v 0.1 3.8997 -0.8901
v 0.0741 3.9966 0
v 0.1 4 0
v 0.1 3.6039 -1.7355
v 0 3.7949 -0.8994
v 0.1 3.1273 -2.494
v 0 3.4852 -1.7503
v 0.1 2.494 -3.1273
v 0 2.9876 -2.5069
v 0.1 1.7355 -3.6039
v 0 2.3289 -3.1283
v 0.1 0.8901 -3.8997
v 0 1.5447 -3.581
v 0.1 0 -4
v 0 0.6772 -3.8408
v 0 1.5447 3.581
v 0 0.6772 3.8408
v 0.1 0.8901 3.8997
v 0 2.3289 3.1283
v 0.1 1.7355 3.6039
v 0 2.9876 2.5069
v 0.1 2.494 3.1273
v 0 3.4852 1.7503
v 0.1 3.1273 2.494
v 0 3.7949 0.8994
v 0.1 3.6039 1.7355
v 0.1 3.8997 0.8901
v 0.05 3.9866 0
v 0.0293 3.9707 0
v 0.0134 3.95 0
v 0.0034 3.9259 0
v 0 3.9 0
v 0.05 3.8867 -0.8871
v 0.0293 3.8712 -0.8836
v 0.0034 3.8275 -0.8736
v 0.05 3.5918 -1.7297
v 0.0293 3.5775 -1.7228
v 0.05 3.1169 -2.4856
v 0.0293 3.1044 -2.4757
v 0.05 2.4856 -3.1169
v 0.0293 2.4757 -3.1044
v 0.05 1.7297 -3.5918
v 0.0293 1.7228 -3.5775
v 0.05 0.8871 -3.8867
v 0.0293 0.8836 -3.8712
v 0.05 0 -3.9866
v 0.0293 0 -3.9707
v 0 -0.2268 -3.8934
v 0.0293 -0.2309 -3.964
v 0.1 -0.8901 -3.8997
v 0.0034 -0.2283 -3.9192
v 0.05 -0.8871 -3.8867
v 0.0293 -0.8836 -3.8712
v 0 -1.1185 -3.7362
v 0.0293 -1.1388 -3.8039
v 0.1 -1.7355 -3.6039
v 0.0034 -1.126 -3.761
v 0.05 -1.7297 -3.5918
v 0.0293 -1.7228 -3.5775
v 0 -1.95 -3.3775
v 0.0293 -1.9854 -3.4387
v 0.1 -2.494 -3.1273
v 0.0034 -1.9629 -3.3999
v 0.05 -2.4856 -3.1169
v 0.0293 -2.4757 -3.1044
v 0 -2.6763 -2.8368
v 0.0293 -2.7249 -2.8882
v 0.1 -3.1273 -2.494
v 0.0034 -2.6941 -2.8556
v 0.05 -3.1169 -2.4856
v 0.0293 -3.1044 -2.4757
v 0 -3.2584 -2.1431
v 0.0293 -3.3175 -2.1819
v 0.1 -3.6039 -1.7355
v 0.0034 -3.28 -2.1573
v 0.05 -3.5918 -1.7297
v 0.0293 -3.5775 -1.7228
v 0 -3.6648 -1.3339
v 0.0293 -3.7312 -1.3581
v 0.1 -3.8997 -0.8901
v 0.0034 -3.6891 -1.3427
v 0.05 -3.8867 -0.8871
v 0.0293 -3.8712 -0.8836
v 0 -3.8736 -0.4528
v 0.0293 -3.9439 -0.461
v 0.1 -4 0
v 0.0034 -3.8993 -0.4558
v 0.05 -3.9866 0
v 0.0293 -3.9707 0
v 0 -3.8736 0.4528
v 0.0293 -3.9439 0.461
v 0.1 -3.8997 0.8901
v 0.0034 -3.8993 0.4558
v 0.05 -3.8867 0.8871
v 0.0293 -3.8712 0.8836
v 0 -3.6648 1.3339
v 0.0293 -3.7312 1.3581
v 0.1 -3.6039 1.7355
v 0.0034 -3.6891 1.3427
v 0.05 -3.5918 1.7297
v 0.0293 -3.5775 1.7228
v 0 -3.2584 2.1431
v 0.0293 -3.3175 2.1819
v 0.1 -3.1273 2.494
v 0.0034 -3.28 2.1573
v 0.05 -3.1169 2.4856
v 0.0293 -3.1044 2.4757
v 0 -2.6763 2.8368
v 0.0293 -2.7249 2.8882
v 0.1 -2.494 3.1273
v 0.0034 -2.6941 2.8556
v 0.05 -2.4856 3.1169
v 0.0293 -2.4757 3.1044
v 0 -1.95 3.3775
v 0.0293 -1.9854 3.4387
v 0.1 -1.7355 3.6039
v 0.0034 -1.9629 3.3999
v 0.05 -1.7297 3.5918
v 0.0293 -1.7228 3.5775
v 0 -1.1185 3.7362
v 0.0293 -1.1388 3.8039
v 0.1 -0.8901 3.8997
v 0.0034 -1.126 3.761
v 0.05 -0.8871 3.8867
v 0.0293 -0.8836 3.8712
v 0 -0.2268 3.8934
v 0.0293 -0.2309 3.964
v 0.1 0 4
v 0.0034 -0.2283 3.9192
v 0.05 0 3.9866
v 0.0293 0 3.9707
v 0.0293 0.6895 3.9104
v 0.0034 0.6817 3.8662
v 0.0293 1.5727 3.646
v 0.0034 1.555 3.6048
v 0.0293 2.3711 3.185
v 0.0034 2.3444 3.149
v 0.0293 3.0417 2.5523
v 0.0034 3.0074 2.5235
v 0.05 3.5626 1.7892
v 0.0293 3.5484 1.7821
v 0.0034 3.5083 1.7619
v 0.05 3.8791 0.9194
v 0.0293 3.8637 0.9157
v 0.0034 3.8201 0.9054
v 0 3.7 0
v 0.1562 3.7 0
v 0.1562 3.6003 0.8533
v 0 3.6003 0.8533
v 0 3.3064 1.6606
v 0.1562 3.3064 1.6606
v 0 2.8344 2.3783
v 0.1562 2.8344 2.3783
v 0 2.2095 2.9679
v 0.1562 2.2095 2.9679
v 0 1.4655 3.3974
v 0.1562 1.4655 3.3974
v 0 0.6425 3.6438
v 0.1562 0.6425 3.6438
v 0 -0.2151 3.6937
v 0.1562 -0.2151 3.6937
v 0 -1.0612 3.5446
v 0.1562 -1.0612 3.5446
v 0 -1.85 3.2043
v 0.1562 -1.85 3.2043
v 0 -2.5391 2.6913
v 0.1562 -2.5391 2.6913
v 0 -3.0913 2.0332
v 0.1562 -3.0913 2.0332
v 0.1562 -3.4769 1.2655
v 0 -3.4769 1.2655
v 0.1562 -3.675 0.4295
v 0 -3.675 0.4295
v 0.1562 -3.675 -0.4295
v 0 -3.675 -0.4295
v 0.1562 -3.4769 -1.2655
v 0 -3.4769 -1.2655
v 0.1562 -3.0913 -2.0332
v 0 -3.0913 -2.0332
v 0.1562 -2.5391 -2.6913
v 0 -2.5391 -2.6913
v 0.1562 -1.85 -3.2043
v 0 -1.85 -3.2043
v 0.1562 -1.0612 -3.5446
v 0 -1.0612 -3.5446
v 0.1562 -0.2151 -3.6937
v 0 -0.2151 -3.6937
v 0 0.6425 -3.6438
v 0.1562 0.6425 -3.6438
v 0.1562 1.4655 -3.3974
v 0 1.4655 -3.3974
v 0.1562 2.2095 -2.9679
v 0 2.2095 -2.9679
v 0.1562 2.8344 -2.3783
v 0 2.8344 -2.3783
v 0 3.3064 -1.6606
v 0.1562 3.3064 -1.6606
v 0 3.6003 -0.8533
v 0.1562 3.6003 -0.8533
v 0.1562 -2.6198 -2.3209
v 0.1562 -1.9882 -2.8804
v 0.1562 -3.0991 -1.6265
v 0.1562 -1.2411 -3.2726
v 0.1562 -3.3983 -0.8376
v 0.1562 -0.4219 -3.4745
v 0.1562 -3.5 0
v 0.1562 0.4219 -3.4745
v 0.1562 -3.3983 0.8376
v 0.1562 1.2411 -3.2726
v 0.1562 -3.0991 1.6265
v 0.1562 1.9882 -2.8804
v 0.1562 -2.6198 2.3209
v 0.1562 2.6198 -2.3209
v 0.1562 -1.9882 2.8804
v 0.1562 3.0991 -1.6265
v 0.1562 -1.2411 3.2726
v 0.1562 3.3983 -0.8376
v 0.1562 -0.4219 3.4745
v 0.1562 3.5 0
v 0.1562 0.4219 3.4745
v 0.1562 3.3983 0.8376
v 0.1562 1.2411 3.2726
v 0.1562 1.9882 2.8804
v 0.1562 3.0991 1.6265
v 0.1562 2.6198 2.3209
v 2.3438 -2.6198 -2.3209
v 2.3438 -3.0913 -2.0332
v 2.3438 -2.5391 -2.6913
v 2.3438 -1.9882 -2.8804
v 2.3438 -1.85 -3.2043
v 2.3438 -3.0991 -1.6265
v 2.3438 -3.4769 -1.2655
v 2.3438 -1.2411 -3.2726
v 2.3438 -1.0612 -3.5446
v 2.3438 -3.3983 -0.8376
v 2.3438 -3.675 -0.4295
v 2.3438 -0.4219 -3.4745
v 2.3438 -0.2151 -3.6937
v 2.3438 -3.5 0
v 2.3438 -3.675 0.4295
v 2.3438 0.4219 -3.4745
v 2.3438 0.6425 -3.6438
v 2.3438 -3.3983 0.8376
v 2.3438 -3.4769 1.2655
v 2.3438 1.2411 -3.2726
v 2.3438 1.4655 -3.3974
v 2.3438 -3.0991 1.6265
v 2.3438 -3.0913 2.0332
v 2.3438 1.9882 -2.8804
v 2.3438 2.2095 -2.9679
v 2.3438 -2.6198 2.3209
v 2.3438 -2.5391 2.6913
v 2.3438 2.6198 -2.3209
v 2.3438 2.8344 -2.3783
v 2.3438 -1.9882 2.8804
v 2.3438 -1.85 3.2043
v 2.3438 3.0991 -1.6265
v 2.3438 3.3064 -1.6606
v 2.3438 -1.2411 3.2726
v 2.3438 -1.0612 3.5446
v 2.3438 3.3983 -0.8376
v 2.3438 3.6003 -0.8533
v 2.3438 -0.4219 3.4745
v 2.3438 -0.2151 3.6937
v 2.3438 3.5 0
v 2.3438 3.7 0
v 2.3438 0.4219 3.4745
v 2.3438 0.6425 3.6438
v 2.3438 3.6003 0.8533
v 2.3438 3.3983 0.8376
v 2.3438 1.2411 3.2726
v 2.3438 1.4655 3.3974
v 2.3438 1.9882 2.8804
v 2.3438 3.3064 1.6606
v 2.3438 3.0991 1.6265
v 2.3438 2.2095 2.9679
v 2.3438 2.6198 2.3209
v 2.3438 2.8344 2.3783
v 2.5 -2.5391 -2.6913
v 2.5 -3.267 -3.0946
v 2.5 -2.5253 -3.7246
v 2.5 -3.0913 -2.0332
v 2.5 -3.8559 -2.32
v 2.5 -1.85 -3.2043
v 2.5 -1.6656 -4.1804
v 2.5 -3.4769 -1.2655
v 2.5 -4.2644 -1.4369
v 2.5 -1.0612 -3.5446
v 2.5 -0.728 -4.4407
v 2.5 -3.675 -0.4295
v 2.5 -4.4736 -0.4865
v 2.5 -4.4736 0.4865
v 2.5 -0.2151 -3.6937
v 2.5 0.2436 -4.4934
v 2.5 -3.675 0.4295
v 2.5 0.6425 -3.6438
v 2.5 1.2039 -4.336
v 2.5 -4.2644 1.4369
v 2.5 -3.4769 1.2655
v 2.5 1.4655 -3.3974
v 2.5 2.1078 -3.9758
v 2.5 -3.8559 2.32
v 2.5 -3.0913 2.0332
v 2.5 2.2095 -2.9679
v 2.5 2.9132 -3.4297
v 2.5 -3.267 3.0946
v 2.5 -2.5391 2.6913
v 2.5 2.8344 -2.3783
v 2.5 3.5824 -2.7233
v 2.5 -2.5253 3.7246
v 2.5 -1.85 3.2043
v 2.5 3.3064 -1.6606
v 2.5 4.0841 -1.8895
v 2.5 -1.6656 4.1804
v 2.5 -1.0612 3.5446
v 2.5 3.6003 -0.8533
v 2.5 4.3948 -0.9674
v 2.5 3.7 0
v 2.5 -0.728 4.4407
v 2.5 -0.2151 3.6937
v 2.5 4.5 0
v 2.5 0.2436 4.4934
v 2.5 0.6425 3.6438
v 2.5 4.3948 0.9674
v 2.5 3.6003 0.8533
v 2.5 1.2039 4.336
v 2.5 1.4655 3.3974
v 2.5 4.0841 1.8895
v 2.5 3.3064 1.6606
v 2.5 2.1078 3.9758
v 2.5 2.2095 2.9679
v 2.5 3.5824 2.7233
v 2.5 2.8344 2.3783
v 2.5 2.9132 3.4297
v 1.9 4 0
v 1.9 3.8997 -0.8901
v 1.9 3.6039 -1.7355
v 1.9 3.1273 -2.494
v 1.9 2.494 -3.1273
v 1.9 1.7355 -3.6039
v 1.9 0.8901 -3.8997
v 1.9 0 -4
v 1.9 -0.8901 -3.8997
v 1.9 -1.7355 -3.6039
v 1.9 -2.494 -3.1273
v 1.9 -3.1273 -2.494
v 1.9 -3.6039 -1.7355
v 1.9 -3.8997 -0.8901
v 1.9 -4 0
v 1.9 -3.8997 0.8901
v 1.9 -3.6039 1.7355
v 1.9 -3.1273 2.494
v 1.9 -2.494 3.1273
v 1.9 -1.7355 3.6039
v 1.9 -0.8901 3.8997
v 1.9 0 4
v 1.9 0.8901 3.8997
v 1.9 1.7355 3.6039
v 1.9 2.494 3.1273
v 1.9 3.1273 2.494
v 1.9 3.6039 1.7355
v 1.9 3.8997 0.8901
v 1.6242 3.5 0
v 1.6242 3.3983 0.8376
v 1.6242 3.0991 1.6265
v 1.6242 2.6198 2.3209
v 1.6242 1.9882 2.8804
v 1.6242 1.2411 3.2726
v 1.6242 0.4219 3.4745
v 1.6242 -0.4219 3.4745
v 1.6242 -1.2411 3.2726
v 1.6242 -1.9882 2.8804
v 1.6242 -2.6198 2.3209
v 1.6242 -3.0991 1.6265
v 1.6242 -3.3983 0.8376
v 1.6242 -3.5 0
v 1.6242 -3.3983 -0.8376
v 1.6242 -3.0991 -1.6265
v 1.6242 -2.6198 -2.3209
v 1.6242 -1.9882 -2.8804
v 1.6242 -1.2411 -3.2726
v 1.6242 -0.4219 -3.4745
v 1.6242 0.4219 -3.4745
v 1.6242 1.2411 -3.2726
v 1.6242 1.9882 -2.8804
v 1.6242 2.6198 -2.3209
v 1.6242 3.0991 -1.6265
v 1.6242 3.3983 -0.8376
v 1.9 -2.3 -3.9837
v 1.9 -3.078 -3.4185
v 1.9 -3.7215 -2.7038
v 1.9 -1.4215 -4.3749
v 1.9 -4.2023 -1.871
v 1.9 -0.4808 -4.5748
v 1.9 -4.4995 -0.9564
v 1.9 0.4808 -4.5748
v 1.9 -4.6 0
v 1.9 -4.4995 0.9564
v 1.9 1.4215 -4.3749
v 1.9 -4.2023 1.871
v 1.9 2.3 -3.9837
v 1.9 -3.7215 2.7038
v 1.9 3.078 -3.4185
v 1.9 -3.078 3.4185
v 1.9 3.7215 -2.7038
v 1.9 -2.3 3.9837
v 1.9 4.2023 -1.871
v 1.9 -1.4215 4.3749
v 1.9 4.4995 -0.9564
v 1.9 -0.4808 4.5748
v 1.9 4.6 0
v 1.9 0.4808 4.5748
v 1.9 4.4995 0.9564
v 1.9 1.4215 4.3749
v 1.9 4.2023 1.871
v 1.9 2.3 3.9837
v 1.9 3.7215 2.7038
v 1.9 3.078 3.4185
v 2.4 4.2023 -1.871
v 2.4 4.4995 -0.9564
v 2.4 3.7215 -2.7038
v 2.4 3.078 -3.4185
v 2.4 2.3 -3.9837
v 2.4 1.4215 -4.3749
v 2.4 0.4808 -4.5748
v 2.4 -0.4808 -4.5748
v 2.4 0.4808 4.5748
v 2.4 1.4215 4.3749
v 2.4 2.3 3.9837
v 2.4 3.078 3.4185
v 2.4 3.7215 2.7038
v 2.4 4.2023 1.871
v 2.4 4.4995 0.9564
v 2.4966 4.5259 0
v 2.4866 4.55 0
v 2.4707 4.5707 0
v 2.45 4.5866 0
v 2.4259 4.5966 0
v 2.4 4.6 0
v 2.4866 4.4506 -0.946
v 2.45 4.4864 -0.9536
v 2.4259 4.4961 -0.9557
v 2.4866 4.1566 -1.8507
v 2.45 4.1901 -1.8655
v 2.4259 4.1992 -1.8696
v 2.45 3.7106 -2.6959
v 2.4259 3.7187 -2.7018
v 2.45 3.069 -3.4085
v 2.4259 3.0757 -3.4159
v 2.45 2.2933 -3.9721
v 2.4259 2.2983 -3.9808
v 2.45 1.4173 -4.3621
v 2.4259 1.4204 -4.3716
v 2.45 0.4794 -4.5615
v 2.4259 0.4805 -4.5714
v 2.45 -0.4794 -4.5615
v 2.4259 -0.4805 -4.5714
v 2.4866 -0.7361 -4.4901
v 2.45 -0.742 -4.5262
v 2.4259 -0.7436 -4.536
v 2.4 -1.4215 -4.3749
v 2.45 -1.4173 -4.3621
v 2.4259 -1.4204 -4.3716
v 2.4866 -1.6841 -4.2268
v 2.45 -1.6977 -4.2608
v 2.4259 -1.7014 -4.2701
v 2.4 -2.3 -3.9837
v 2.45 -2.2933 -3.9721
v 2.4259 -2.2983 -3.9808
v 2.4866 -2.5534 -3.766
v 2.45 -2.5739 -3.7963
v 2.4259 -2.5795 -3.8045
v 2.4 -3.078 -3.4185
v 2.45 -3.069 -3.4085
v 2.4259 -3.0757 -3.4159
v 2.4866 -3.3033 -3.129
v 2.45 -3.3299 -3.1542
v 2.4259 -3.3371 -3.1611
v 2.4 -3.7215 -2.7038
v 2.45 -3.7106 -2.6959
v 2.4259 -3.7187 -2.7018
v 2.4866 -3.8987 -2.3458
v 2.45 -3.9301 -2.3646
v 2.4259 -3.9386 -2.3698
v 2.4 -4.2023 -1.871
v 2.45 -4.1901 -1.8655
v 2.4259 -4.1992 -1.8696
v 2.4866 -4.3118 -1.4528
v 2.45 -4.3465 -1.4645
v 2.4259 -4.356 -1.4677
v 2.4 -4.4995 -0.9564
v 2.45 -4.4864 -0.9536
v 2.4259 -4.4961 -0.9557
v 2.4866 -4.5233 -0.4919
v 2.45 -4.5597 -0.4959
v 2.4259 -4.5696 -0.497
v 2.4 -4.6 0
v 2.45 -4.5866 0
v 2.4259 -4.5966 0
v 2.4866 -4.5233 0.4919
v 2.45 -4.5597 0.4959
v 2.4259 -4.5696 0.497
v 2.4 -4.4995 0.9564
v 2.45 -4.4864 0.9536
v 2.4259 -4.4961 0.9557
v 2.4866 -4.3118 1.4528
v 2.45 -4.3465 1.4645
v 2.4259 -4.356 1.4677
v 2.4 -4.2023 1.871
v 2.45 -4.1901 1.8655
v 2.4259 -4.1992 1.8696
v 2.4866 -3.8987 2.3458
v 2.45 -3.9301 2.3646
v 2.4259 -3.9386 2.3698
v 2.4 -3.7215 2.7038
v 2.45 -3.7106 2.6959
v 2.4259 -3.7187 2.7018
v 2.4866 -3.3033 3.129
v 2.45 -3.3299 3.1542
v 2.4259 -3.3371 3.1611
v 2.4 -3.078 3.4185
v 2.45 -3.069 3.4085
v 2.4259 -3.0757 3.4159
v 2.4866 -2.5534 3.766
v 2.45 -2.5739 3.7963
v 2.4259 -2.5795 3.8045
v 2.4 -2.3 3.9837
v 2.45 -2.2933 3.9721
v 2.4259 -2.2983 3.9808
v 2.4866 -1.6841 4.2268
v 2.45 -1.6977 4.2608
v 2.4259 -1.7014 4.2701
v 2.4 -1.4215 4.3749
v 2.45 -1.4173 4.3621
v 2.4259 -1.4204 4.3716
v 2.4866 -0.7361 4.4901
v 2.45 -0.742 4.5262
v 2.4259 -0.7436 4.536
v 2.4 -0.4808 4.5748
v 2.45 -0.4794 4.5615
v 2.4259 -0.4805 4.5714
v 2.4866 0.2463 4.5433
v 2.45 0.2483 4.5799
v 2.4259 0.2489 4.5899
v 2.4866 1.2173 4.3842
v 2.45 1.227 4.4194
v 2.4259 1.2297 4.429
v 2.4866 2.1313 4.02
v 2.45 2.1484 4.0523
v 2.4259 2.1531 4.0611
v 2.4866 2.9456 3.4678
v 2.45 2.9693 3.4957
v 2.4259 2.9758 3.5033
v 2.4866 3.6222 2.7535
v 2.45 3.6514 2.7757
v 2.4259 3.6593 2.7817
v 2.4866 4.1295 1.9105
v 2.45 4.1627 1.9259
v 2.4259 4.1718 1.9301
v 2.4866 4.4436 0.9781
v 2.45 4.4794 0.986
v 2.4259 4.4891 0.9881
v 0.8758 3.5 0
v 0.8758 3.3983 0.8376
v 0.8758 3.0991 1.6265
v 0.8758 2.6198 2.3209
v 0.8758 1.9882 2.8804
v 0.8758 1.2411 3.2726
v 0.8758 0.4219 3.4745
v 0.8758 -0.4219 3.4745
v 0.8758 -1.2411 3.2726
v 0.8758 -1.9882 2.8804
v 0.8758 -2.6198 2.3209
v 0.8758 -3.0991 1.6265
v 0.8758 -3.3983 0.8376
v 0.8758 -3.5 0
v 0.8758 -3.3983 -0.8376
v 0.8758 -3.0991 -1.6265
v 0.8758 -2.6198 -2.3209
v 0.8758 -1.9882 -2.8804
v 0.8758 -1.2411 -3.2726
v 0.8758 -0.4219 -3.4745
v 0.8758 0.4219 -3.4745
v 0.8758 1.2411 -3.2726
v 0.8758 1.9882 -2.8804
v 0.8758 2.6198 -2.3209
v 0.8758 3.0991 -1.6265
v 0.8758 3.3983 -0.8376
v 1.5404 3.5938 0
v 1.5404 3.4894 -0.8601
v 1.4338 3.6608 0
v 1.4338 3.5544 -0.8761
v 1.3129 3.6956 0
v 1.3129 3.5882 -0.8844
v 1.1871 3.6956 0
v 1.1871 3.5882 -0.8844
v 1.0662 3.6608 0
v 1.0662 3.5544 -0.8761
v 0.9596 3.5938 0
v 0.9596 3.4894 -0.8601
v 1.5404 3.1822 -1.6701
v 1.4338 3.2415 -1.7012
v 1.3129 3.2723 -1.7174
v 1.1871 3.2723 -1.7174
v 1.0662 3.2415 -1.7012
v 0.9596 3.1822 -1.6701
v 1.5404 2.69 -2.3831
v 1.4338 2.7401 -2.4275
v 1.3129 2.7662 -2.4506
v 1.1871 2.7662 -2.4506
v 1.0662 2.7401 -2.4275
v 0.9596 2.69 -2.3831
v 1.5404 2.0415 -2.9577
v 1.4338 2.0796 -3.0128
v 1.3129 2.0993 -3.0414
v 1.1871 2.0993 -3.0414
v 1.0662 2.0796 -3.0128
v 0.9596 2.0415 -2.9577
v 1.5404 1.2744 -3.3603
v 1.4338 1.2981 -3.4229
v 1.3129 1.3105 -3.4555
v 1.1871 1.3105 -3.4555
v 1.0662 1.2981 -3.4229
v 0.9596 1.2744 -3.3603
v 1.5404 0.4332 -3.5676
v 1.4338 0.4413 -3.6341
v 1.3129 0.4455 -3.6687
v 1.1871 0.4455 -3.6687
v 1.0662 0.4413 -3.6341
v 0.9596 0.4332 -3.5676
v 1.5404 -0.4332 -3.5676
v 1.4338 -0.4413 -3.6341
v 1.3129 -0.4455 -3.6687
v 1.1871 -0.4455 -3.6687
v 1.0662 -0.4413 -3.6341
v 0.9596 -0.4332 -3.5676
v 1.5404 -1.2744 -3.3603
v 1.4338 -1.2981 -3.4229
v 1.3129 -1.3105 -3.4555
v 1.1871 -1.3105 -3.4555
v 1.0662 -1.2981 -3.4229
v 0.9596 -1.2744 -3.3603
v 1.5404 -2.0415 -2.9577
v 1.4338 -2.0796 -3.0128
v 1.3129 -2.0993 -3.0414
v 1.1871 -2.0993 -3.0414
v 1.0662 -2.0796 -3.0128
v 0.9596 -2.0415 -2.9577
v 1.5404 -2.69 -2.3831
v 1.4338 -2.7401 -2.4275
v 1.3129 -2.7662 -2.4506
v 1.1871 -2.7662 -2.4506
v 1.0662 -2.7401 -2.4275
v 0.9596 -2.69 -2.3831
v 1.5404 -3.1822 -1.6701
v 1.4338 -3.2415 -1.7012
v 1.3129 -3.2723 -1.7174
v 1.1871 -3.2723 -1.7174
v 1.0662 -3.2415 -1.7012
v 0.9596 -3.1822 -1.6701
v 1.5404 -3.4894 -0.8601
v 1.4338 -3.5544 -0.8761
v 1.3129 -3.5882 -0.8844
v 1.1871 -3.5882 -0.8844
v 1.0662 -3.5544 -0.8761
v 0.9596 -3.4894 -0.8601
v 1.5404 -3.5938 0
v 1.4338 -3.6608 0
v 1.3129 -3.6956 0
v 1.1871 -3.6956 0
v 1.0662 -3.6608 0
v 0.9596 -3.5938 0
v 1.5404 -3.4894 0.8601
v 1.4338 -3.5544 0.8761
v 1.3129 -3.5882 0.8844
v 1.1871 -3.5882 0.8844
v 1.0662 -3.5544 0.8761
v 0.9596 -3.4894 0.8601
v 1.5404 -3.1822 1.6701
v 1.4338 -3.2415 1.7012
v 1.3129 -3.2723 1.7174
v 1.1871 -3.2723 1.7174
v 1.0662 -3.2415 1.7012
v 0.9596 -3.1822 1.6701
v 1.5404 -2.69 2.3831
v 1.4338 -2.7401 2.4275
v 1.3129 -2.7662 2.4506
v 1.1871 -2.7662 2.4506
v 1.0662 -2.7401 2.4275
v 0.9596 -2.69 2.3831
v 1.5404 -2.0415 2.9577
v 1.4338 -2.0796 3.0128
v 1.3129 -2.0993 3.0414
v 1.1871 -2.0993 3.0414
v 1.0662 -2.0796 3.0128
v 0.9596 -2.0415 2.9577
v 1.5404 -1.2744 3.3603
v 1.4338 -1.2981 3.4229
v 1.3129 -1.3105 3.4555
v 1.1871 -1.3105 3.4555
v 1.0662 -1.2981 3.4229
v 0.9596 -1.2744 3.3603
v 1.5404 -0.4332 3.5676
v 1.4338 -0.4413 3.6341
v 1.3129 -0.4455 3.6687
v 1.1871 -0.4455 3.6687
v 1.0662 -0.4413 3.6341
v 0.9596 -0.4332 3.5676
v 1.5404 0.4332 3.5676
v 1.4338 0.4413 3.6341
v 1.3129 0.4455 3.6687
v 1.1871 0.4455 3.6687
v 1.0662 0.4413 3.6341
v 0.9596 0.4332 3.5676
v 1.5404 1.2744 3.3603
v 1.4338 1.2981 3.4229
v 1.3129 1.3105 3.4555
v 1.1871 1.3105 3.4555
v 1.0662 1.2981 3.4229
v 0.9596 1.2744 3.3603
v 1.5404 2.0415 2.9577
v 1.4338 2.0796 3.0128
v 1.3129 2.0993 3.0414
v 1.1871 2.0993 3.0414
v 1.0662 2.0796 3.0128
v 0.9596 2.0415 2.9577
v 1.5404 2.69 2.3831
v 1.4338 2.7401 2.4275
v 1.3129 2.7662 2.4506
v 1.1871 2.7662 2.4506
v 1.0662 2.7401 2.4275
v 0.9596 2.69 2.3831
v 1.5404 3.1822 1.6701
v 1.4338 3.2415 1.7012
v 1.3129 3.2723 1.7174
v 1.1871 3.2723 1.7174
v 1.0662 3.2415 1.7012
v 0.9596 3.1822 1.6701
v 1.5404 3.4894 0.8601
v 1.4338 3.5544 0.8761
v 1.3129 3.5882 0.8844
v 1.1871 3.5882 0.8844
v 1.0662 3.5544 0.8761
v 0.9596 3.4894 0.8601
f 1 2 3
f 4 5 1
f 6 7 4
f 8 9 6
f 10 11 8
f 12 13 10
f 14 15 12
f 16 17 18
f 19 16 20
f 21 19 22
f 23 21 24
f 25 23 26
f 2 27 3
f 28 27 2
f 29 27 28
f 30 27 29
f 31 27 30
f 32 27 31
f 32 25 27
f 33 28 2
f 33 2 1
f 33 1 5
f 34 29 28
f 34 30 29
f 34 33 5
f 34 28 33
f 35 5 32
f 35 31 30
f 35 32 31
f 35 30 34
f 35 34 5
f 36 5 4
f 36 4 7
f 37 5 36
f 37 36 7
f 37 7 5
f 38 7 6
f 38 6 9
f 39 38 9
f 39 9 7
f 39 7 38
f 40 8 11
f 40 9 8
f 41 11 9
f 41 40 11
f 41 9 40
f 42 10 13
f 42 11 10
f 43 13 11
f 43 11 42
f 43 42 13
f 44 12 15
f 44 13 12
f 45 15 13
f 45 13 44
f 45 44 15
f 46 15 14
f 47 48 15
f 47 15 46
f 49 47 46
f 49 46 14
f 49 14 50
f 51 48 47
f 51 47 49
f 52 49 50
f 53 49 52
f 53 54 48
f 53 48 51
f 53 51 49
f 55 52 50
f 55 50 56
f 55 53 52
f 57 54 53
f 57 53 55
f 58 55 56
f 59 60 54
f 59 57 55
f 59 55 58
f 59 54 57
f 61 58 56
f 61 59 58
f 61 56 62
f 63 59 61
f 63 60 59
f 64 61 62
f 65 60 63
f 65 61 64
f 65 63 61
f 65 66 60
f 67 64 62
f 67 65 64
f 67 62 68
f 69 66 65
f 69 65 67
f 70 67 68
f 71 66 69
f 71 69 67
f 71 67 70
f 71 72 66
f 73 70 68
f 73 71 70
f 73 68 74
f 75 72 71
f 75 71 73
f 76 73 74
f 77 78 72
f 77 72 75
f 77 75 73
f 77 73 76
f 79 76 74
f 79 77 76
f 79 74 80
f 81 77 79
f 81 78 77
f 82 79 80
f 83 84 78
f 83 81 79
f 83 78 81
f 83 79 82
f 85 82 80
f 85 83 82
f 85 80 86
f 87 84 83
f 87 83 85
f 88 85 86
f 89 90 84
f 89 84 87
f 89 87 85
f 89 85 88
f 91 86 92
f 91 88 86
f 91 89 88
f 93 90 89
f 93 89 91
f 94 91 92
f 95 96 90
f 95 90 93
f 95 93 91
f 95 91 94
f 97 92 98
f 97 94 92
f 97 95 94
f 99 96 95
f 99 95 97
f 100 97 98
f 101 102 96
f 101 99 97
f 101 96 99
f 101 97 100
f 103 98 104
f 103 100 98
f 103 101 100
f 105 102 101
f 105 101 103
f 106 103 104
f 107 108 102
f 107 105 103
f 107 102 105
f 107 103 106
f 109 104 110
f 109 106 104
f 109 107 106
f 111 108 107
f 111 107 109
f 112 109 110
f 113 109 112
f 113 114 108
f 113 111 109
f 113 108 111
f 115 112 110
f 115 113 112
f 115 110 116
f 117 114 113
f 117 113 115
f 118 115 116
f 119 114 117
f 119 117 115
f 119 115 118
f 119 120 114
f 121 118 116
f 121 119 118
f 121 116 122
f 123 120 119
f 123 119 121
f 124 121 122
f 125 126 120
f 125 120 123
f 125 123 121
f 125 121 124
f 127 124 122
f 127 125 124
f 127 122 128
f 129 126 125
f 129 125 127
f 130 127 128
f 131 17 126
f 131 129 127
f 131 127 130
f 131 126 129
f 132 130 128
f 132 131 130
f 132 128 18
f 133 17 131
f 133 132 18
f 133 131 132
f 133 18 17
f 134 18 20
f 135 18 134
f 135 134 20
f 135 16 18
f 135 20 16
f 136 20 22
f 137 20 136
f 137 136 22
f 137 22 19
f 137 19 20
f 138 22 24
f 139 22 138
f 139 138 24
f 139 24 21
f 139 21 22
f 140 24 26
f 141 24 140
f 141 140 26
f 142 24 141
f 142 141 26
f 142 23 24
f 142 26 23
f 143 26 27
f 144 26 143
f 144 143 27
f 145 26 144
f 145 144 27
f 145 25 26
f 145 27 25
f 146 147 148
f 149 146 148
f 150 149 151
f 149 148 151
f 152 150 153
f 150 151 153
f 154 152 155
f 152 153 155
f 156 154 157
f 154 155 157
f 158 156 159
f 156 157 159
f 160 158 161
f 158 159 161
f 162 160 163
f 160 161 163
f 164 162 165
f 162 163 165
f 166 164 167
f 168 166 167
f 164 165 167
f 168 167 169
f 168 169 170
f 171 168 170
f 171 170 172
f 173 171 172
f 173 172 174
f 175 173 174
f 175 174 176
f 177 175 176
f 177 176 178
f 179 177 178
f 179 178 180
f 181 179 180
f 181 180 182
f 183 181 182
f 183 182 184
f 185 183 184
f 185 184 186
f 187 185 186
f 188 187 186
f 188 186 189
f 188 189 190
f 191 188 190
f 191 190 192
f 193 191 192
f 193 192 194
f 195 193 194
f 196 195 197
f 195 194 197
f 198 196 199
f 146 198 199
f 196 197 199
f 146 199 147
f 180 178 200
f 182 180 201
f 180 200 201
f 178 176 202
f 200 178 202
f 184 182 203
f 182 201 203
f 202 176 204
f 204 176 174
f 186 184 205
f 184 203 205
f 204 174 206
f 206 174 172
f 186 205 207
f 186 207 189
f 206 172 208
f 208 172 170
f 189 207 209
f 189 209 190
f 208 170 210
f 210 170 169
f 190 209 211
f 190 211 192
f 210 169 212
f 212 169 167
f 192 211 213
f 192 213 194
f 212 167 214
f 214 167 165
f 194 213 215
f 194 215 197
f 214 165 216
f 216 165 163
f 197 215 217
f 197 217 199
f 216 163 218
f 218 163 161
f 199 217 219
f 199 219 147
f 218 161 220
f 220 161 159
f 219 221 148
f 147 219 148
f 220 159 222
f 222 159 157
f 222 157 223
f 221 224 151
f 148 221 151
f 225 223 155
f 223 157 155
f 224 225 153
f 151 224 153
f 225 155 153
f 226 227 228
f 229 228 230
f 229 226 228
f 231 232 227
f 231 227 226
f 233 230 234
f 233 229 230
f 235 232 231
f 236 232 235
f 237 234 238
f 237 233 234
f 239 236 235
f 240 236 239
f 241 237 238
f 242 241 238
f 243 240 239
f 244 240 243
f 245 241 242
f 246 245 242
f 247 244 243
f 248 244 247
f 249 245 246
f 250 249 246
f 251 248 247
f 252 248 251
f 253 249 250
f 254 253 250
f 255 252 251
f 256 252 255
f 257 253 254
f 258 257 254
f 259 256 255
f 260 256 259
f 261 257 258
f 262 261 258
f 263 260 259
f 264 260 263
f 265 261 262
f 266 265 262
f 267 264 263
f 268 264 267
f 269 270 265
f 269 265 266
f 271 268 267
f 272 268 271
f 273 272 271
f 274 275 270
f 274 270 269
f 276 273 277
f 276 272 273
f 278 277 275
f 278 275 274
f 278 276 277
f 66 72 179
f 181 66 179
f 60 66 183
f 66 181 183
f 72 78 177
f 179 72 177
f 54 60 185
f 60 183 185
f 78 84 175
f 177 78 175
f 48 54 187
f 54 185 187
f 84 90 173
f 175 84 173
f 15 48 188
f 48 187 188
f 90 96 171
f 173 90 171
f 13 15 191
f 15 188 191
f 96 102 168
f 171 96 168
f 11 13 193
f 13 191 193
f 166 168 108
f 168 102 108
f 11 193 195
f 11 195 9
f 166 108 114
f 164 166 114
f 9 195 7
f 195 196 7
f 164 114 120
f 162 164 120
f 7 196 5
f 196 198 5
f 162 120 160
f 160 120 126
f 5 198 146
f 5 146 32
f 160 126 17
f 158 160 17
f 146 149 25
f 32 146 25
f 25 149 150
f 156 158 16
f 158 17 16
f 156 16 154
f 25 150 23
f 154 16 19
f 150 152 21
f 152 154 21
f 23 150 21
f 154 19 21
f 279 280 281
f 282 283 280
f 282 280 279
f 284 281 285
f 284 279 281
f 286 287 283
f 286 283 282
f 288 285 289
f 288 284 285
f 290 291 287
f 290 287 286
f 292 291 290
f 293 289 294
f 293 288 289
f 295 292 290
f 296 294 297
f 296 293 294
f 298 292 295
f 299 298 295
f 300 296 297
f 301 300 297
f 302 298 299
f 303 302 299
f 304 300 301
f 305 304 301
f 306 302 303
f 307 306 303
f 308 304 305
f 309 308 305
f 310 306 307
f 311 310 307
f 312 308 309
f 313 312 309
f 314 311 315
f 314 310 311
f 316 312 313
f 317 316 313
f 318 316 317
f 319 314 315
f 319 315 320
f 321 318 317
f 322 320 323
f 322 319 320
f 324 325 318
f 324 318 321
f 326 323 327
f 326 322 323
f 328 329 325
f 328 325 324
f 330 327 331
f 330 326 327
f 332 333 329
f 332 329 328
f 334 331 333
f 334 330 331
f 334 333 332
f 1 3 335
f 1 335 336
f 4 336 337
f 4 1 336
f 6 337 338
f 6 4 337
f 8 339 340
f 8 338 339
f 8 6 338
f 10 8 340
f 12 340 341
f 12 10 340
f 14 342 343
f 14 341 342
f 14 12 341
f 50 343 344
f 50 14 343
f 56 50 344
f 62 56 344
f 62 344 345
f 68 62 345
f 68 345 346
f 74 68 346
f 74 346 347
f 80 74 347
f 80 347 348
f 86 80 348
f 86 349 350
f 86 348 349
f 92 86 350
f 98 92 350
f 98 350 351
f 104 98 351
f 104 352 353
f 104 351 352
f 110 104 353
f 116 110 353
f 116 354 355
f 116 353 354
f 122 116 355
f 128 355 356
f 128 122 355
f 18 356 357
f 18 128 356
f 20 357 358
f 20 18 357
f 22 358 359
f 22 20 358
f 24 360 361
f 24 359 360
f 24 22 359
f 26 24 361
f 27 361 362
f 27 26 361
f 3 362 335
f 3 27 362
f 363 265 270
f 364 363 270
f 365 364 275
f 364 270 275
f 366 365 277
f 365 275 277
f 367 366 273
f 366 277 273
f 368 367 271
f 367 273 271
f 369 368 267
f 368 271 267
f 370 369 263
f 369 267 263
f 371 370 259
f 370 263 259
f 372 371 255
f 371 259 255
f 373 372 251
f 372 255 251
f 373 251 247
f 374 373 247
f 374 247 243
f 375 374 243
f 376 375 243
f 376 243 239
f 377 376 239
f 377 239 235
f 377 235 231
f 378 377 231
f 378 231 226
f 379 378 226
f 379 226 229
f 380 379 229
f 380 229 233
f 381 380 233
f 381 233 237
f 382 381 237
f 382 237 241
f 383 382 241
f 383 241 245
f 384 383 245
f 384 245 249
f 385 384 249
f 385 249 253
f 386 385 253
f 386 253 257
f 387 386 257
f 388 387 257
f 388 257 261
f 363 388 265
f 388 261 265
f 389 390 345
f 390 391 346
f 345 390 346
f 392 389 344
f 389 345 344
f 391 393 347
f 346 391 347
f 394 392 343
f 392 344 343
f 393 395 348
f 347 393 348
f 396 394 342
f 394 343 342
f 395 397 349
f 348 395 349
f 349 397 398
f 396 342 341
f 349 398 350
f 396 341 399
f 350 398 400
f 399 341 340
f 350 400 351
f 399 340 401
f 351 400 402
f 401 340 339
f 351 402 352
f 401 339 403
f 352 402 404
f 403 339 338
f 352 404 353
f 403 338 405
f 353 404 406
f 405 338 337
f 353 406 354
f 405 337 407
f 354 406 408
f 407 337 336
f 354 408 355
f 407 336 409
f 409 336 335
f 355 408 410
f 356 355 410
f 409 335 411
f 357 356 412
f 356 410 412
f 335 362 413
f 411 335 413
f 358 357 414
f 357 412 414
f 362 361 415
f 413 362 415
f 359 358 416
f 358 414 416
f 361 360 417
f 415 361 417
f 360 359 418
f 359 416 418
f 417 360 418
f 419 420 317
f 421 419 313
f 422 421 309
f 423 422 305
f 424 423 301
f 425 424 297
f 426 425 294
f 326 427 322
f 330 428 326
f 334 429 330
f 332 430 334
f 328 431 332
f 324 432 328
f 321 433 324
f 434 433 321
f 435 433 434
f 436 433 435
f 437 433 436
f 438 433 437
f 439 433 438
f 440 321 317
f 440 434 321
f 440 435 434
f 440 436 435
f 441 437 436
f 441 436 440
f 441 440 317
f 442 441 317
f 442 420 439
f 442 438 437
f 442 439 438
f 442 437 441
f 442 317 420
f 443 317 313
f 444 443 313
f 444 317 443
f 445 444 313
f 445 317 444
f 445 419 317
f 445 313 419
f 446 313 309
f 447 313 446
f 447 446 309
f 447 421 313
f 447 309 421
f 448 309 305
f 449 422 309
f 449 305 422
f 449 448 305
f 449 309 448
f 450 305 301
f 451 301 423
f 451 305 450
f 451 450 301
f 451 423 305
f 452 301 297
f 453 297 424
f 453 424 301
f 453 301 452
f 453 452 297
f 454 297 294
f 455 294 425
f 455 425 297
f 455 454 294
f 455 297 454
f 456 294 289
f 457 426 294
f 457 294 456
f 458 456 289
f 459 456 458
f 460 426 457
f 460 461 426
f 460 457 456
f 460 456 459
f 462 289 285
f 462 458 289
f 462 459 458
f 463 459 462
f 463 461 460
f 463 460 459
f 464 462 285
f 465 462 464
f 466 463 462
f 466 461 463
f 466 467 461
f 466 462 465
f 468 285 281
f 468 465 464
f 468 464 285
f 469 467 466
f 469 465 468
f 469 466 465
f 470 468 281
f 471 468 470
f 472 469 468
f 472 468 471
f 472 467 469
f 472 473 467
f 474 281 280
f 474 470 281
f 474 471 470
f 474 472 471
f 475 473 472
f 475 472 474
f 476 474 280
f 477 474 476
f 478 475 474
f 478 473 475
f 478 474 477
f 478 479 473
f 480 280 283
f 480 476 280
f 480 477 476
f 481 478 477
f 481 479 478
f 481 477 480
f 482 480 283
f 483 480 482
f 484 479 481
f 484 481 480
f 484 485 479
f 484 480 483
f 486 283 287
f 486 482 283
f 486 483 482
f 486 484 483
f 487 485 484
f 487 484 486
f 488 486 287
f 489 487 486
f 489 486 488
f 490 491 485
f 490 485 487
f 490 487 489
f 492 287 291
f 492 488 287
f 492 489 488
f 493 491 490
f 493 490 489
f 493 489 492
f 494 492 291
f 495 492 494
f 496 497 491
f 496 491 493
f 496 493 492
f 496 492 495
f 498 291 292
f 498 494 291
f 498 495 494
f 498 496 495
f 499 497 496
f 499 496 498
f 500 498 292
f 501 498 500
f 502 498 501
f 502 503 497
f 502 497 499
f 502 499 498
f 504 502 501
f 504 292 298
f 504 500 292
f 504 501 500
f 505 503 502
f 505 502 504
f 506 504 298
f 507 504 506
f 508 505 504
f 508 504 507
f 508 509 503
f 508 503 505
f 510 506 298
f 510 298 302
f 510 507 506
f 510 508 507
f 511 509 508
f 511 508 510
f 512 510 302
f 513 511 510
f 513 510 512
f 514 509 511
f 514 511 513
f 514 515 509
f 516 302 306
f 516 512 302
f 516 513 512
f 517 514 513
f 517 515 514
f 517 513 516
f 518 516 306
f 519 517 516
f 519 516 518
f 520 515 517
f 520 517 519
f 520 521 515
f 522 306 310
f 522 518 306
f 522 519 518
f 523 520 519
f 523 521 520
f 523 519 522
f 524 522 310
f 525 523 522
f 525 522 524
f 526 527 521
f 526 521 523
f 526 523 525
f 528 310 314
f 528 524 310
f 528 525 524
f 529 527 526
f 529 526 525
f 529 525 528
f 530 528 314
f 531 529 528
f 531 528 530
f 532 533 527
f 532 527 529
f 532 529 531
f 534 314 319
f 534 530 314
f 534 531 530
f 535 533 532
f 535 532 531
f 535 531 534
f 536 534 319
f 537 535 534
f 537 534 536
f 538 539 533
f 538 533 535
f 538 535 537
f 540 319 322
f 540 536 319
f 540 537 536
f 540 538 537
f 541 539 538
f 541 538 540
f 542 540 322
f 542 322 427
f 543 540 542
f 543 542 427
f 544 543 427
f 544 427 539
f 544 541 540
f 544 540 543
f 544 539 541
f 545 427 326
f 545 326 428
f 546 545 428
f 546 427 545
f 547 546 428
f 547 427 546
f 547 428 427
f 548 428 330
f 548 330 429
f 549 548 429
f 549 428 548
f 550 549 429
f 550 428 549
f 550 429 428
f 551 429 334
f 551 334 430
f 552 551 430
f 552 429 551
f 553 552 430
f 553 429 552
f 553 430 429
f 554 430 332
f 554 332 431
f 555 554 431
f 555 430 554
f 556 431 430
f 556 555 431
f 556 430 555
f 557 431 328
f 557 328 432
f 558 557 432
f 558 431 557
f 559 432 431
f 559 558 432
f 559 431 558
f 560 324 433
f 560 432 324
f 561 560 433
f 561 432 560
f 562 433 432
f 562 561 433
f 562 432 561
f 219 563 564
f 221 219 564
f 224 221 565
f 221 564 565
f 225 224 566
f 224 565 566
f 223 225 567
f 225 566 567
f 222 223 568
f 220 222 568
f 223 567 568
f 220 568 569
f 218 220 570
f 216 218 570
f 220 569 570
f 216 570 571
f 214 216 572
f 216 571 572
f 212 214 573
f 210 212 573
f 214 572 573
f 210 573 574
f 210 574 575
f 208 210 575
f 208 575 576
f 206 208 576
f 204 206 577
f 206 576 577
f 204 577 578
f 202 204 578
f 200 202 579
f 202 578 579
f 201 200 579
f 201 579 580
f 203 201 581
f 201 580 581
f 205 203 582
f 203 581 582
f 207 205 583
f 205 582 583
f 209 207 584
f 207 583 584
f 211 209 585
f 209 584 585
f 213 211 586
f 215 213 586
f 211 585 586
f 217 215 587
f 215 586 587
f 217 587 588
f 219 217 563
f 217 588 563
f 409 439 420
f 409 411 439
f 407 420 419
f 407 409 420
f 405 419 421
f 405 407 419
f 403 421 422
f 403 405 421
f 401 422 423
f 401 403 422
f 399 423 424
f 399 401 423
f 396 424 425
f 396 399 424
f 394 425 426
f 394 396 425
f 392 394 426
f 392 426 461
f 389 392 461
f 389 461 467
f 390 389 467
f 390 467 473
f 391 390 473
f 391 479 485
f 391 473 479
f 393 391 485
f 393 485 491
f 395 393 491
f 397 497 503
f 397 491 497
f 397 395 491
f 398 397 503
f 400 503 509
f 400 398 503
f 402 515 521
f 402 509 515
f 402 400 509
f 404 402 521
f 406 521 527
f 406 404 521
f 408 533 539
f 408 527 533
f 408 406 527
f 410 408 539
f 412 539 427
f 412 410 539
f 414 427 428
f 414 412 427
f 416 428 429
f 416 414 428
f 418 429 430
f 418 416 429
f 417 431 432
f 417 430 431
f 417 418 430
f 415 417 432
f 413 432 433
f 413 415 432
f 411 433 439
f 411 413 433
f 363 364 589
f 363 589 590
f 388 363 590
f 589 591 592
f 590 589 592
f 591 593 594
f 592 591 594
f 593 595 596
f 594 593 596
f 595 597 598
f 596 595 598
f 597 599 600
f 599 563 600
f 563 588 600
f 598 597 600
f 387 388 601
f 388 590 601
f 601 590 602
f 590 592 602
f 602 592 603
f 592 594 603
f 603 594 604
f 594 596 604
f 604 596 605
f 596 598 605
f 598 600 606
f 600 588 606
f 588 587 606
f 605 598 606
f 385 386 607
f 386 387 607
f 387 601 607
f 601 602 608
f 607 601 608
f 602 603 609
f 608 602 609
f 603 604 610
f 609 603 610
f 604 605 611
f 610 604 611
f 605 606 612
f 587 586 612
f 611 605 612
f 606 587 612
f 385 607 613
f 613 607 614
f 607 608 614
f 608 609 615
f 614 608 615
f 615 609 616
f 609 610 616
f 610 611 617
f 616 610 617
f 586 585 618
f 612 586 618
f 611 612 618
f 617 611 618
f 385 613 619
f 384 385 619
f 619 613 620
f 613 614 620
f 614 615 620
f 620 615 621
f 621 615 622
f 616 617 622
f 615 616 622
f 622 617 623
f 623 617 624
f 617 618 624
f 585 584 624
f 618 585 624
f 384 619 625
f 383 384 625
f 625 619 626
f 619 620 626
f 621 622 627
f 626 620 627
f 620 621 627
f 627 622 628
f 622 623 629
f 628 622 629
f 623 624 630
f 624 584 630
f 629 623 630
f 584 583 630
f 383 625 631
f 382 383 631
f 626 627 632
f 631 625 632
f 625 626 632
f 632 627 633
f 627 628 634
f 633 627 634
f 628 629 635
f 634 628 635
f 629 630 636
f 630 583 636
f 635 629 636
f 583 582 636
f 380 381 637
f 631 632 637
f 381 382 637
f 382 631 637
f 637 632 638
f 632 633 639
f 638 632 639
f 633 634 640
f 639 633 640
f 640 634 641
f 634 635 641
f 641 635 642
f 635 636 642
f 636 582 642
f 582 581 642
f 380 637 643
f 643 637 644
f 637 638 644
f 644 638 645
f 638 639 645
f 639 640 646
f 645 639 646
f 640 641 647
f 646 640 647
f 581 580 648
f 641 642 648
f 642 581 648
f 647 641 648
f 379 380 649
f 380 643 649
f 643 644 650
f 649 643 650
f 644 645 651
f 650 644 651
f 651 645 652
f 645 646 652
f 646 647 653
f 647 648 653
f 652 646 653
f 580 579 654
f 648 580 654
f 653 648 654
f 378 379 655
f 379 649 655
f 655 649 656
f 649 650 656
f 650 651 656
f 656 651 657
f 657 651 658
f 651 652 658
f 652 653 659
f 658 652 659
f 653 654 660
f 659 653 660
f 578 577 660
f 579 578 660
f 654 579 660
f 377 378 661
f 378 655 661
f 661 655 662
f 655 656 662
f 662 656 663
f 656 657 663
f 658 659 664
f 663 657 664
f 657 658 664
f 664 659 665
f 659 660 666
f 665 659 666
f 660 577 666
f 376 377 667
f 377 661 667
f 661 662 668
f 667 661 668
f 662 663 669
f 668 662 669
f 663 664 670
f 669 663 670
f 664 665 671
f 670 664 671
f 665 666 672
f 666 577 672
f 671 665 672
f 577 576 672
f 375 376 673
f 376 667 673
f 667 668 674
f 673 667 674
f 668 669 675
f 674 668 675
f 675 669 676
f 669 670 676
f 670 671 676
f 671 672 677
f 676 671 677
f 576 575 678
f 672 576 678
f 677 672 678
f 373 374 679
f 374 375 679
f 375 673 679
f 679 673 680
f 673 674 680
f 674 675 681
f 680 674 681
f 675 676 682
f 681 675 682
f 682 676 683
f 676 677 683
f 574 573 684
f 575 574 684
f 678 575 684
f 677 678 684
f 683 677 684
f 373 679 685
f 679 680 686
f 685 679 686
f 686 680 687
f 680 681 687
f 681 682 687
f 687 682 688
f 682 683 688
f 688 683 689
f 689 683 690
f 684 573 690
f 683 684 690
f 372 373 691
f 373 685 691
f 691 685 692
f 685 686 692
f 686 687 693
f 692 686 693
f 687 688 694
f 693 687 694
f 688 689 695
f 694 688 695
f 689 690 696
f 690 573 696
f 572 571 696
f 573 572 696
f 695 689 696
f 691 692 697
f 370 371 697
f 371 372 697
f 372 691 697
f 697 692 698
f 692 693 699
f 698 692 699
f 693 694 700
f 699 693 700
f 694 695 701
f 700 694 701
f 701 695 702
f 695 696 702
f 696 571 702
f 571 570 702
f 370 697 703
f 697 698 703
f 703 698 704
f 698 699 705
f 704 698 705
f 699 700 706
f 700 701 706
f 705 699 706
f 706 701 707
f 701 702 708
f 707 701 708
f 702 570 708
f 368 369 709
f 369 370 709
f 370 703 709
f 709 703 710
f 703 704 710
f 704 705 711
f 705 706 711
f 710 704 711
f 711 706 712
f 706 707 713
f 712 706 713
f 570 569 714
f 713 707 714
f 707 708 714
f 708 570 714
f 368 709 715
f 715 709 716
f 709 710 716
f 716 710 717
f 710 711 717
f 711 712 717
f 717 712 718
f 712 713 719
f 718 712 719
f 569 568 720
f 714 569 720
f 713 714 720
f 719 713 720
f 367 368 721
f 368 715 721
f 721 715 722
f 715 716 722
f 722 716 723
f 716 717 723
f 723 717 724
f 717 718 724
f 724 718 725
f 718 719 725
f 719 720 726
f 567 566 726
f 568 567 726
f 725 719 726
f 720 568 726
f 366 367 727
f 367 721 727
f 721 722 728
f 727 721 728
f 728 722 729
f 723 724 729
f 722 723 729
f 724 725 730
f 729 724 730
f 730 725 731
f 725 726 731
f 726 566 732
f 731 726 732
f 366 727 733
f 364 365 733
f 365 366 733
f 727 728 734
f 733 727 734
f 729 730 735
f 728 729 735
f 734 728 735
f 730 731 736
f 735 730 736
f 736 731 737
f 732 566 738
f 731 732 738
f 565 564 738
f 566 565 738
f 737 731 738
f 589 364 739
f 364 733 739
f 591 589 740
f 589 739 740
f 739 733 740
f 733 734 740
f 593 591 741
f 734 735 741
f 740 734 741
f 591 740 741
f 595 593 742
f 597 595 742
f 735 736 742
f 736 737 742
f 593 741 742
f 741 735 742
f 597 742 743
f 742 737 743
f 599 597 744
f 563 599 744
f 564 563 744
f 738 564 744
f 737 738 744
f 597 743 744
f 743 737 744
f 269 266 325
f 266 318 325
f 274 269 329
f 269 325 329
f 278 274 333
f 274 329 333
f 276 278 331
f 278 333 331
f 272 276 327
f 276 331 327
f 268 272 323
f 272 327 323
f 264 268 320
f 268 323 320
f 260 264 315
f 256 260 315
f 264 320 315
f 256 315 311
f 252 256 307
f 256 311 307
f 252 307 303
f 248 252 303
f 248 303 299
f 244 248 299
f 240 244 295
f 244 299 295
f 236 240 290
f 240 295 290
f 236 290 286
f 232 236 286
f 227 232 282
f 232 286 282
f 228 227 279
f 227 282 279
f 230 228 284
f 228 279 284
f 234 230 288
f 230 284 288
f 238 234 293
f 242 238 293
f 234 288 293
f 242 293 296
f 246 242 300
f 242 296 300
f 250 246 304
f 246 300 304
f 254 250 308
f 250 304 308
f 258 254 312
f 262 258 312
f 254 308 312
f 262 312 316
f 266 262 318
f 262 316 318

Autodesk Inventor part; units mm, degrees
sketch "Sketch_1" plane through (0, 0, 0) normal (0, 0, 1) x (1, 0, 0)
  line L0 (2.5, 0) -> (0, 0)
  line L1 (0, 3.7) -> (0.1562, 3.7)
  line L2 (0.1562, 3.7) -> (0.1562, 3.5)
  line L3 (0.1562, 3.5) -> (0.8758, 3.5)
  arc A0 (1.6242, 3.5) -> (0.8758, 3.5) centre (1.25, 3.25) ccw
  line L4 (1.6242, 3.5) -> (2.3438, 3.5)
  line L5 (2.3438, 3.5) -> (2.3438, 3.7)
  line L6 (2.3438, 3.7) -> (2.5, 3.7)
  line L7 (2.5, 3.7) -> (2.5, 4.5)
  arc A1 (2.5, 4.5) -> (2.4, 4.6) centre (2.4, 4.5) ccw
  line L8 (2.4, 4.6) -> (1.9, 4.6)
  line L9 (1.9, 4.6) -> (1.9, 4)
  line L10 (1.9, 4) -> (0.1, 4)
  arc A2 (0.1, 4) -> (0, 3.9) centre (0.1, 3.9) ccw
  line L11 (0, 3.9) -> (0, 3.7)
revolve "Revolution1" add sketch "Sketch_1" angle 360 about axis through (2.5, 0, 0) along (1, 0, 0)
ref_plane "ip_st_1_XY" through (0, 0, 0) normal (1, 0, 0) x (0, 0, -1)
ref_plane "ip_st_1_YZ" through (0, 0, 0) normal (0, 0, -1) x (0, 1, 0)
ref_plane "ip_st_1_ZX" through (0, 0, 0) normal (0, 1, 0) x (1, 0, 0)
ref_plane "ip_st_2_XY" through (2.3438, 0, 0) normal (-1, 0, 0) x (0, 0, -1)
ref_plane "ip_st_2_YZ" through (2.3438, 0, 0) normal (0, 0, -1) x (0, -1, 0)
ref_plane "ip_st_2_ZX" through (2.3438, 0, 0) normal (0, -1, 0) x (-1, 0, 0)
properties part number "MF85ZZ Outer Ring" material "ステンレス鋼 440C"
